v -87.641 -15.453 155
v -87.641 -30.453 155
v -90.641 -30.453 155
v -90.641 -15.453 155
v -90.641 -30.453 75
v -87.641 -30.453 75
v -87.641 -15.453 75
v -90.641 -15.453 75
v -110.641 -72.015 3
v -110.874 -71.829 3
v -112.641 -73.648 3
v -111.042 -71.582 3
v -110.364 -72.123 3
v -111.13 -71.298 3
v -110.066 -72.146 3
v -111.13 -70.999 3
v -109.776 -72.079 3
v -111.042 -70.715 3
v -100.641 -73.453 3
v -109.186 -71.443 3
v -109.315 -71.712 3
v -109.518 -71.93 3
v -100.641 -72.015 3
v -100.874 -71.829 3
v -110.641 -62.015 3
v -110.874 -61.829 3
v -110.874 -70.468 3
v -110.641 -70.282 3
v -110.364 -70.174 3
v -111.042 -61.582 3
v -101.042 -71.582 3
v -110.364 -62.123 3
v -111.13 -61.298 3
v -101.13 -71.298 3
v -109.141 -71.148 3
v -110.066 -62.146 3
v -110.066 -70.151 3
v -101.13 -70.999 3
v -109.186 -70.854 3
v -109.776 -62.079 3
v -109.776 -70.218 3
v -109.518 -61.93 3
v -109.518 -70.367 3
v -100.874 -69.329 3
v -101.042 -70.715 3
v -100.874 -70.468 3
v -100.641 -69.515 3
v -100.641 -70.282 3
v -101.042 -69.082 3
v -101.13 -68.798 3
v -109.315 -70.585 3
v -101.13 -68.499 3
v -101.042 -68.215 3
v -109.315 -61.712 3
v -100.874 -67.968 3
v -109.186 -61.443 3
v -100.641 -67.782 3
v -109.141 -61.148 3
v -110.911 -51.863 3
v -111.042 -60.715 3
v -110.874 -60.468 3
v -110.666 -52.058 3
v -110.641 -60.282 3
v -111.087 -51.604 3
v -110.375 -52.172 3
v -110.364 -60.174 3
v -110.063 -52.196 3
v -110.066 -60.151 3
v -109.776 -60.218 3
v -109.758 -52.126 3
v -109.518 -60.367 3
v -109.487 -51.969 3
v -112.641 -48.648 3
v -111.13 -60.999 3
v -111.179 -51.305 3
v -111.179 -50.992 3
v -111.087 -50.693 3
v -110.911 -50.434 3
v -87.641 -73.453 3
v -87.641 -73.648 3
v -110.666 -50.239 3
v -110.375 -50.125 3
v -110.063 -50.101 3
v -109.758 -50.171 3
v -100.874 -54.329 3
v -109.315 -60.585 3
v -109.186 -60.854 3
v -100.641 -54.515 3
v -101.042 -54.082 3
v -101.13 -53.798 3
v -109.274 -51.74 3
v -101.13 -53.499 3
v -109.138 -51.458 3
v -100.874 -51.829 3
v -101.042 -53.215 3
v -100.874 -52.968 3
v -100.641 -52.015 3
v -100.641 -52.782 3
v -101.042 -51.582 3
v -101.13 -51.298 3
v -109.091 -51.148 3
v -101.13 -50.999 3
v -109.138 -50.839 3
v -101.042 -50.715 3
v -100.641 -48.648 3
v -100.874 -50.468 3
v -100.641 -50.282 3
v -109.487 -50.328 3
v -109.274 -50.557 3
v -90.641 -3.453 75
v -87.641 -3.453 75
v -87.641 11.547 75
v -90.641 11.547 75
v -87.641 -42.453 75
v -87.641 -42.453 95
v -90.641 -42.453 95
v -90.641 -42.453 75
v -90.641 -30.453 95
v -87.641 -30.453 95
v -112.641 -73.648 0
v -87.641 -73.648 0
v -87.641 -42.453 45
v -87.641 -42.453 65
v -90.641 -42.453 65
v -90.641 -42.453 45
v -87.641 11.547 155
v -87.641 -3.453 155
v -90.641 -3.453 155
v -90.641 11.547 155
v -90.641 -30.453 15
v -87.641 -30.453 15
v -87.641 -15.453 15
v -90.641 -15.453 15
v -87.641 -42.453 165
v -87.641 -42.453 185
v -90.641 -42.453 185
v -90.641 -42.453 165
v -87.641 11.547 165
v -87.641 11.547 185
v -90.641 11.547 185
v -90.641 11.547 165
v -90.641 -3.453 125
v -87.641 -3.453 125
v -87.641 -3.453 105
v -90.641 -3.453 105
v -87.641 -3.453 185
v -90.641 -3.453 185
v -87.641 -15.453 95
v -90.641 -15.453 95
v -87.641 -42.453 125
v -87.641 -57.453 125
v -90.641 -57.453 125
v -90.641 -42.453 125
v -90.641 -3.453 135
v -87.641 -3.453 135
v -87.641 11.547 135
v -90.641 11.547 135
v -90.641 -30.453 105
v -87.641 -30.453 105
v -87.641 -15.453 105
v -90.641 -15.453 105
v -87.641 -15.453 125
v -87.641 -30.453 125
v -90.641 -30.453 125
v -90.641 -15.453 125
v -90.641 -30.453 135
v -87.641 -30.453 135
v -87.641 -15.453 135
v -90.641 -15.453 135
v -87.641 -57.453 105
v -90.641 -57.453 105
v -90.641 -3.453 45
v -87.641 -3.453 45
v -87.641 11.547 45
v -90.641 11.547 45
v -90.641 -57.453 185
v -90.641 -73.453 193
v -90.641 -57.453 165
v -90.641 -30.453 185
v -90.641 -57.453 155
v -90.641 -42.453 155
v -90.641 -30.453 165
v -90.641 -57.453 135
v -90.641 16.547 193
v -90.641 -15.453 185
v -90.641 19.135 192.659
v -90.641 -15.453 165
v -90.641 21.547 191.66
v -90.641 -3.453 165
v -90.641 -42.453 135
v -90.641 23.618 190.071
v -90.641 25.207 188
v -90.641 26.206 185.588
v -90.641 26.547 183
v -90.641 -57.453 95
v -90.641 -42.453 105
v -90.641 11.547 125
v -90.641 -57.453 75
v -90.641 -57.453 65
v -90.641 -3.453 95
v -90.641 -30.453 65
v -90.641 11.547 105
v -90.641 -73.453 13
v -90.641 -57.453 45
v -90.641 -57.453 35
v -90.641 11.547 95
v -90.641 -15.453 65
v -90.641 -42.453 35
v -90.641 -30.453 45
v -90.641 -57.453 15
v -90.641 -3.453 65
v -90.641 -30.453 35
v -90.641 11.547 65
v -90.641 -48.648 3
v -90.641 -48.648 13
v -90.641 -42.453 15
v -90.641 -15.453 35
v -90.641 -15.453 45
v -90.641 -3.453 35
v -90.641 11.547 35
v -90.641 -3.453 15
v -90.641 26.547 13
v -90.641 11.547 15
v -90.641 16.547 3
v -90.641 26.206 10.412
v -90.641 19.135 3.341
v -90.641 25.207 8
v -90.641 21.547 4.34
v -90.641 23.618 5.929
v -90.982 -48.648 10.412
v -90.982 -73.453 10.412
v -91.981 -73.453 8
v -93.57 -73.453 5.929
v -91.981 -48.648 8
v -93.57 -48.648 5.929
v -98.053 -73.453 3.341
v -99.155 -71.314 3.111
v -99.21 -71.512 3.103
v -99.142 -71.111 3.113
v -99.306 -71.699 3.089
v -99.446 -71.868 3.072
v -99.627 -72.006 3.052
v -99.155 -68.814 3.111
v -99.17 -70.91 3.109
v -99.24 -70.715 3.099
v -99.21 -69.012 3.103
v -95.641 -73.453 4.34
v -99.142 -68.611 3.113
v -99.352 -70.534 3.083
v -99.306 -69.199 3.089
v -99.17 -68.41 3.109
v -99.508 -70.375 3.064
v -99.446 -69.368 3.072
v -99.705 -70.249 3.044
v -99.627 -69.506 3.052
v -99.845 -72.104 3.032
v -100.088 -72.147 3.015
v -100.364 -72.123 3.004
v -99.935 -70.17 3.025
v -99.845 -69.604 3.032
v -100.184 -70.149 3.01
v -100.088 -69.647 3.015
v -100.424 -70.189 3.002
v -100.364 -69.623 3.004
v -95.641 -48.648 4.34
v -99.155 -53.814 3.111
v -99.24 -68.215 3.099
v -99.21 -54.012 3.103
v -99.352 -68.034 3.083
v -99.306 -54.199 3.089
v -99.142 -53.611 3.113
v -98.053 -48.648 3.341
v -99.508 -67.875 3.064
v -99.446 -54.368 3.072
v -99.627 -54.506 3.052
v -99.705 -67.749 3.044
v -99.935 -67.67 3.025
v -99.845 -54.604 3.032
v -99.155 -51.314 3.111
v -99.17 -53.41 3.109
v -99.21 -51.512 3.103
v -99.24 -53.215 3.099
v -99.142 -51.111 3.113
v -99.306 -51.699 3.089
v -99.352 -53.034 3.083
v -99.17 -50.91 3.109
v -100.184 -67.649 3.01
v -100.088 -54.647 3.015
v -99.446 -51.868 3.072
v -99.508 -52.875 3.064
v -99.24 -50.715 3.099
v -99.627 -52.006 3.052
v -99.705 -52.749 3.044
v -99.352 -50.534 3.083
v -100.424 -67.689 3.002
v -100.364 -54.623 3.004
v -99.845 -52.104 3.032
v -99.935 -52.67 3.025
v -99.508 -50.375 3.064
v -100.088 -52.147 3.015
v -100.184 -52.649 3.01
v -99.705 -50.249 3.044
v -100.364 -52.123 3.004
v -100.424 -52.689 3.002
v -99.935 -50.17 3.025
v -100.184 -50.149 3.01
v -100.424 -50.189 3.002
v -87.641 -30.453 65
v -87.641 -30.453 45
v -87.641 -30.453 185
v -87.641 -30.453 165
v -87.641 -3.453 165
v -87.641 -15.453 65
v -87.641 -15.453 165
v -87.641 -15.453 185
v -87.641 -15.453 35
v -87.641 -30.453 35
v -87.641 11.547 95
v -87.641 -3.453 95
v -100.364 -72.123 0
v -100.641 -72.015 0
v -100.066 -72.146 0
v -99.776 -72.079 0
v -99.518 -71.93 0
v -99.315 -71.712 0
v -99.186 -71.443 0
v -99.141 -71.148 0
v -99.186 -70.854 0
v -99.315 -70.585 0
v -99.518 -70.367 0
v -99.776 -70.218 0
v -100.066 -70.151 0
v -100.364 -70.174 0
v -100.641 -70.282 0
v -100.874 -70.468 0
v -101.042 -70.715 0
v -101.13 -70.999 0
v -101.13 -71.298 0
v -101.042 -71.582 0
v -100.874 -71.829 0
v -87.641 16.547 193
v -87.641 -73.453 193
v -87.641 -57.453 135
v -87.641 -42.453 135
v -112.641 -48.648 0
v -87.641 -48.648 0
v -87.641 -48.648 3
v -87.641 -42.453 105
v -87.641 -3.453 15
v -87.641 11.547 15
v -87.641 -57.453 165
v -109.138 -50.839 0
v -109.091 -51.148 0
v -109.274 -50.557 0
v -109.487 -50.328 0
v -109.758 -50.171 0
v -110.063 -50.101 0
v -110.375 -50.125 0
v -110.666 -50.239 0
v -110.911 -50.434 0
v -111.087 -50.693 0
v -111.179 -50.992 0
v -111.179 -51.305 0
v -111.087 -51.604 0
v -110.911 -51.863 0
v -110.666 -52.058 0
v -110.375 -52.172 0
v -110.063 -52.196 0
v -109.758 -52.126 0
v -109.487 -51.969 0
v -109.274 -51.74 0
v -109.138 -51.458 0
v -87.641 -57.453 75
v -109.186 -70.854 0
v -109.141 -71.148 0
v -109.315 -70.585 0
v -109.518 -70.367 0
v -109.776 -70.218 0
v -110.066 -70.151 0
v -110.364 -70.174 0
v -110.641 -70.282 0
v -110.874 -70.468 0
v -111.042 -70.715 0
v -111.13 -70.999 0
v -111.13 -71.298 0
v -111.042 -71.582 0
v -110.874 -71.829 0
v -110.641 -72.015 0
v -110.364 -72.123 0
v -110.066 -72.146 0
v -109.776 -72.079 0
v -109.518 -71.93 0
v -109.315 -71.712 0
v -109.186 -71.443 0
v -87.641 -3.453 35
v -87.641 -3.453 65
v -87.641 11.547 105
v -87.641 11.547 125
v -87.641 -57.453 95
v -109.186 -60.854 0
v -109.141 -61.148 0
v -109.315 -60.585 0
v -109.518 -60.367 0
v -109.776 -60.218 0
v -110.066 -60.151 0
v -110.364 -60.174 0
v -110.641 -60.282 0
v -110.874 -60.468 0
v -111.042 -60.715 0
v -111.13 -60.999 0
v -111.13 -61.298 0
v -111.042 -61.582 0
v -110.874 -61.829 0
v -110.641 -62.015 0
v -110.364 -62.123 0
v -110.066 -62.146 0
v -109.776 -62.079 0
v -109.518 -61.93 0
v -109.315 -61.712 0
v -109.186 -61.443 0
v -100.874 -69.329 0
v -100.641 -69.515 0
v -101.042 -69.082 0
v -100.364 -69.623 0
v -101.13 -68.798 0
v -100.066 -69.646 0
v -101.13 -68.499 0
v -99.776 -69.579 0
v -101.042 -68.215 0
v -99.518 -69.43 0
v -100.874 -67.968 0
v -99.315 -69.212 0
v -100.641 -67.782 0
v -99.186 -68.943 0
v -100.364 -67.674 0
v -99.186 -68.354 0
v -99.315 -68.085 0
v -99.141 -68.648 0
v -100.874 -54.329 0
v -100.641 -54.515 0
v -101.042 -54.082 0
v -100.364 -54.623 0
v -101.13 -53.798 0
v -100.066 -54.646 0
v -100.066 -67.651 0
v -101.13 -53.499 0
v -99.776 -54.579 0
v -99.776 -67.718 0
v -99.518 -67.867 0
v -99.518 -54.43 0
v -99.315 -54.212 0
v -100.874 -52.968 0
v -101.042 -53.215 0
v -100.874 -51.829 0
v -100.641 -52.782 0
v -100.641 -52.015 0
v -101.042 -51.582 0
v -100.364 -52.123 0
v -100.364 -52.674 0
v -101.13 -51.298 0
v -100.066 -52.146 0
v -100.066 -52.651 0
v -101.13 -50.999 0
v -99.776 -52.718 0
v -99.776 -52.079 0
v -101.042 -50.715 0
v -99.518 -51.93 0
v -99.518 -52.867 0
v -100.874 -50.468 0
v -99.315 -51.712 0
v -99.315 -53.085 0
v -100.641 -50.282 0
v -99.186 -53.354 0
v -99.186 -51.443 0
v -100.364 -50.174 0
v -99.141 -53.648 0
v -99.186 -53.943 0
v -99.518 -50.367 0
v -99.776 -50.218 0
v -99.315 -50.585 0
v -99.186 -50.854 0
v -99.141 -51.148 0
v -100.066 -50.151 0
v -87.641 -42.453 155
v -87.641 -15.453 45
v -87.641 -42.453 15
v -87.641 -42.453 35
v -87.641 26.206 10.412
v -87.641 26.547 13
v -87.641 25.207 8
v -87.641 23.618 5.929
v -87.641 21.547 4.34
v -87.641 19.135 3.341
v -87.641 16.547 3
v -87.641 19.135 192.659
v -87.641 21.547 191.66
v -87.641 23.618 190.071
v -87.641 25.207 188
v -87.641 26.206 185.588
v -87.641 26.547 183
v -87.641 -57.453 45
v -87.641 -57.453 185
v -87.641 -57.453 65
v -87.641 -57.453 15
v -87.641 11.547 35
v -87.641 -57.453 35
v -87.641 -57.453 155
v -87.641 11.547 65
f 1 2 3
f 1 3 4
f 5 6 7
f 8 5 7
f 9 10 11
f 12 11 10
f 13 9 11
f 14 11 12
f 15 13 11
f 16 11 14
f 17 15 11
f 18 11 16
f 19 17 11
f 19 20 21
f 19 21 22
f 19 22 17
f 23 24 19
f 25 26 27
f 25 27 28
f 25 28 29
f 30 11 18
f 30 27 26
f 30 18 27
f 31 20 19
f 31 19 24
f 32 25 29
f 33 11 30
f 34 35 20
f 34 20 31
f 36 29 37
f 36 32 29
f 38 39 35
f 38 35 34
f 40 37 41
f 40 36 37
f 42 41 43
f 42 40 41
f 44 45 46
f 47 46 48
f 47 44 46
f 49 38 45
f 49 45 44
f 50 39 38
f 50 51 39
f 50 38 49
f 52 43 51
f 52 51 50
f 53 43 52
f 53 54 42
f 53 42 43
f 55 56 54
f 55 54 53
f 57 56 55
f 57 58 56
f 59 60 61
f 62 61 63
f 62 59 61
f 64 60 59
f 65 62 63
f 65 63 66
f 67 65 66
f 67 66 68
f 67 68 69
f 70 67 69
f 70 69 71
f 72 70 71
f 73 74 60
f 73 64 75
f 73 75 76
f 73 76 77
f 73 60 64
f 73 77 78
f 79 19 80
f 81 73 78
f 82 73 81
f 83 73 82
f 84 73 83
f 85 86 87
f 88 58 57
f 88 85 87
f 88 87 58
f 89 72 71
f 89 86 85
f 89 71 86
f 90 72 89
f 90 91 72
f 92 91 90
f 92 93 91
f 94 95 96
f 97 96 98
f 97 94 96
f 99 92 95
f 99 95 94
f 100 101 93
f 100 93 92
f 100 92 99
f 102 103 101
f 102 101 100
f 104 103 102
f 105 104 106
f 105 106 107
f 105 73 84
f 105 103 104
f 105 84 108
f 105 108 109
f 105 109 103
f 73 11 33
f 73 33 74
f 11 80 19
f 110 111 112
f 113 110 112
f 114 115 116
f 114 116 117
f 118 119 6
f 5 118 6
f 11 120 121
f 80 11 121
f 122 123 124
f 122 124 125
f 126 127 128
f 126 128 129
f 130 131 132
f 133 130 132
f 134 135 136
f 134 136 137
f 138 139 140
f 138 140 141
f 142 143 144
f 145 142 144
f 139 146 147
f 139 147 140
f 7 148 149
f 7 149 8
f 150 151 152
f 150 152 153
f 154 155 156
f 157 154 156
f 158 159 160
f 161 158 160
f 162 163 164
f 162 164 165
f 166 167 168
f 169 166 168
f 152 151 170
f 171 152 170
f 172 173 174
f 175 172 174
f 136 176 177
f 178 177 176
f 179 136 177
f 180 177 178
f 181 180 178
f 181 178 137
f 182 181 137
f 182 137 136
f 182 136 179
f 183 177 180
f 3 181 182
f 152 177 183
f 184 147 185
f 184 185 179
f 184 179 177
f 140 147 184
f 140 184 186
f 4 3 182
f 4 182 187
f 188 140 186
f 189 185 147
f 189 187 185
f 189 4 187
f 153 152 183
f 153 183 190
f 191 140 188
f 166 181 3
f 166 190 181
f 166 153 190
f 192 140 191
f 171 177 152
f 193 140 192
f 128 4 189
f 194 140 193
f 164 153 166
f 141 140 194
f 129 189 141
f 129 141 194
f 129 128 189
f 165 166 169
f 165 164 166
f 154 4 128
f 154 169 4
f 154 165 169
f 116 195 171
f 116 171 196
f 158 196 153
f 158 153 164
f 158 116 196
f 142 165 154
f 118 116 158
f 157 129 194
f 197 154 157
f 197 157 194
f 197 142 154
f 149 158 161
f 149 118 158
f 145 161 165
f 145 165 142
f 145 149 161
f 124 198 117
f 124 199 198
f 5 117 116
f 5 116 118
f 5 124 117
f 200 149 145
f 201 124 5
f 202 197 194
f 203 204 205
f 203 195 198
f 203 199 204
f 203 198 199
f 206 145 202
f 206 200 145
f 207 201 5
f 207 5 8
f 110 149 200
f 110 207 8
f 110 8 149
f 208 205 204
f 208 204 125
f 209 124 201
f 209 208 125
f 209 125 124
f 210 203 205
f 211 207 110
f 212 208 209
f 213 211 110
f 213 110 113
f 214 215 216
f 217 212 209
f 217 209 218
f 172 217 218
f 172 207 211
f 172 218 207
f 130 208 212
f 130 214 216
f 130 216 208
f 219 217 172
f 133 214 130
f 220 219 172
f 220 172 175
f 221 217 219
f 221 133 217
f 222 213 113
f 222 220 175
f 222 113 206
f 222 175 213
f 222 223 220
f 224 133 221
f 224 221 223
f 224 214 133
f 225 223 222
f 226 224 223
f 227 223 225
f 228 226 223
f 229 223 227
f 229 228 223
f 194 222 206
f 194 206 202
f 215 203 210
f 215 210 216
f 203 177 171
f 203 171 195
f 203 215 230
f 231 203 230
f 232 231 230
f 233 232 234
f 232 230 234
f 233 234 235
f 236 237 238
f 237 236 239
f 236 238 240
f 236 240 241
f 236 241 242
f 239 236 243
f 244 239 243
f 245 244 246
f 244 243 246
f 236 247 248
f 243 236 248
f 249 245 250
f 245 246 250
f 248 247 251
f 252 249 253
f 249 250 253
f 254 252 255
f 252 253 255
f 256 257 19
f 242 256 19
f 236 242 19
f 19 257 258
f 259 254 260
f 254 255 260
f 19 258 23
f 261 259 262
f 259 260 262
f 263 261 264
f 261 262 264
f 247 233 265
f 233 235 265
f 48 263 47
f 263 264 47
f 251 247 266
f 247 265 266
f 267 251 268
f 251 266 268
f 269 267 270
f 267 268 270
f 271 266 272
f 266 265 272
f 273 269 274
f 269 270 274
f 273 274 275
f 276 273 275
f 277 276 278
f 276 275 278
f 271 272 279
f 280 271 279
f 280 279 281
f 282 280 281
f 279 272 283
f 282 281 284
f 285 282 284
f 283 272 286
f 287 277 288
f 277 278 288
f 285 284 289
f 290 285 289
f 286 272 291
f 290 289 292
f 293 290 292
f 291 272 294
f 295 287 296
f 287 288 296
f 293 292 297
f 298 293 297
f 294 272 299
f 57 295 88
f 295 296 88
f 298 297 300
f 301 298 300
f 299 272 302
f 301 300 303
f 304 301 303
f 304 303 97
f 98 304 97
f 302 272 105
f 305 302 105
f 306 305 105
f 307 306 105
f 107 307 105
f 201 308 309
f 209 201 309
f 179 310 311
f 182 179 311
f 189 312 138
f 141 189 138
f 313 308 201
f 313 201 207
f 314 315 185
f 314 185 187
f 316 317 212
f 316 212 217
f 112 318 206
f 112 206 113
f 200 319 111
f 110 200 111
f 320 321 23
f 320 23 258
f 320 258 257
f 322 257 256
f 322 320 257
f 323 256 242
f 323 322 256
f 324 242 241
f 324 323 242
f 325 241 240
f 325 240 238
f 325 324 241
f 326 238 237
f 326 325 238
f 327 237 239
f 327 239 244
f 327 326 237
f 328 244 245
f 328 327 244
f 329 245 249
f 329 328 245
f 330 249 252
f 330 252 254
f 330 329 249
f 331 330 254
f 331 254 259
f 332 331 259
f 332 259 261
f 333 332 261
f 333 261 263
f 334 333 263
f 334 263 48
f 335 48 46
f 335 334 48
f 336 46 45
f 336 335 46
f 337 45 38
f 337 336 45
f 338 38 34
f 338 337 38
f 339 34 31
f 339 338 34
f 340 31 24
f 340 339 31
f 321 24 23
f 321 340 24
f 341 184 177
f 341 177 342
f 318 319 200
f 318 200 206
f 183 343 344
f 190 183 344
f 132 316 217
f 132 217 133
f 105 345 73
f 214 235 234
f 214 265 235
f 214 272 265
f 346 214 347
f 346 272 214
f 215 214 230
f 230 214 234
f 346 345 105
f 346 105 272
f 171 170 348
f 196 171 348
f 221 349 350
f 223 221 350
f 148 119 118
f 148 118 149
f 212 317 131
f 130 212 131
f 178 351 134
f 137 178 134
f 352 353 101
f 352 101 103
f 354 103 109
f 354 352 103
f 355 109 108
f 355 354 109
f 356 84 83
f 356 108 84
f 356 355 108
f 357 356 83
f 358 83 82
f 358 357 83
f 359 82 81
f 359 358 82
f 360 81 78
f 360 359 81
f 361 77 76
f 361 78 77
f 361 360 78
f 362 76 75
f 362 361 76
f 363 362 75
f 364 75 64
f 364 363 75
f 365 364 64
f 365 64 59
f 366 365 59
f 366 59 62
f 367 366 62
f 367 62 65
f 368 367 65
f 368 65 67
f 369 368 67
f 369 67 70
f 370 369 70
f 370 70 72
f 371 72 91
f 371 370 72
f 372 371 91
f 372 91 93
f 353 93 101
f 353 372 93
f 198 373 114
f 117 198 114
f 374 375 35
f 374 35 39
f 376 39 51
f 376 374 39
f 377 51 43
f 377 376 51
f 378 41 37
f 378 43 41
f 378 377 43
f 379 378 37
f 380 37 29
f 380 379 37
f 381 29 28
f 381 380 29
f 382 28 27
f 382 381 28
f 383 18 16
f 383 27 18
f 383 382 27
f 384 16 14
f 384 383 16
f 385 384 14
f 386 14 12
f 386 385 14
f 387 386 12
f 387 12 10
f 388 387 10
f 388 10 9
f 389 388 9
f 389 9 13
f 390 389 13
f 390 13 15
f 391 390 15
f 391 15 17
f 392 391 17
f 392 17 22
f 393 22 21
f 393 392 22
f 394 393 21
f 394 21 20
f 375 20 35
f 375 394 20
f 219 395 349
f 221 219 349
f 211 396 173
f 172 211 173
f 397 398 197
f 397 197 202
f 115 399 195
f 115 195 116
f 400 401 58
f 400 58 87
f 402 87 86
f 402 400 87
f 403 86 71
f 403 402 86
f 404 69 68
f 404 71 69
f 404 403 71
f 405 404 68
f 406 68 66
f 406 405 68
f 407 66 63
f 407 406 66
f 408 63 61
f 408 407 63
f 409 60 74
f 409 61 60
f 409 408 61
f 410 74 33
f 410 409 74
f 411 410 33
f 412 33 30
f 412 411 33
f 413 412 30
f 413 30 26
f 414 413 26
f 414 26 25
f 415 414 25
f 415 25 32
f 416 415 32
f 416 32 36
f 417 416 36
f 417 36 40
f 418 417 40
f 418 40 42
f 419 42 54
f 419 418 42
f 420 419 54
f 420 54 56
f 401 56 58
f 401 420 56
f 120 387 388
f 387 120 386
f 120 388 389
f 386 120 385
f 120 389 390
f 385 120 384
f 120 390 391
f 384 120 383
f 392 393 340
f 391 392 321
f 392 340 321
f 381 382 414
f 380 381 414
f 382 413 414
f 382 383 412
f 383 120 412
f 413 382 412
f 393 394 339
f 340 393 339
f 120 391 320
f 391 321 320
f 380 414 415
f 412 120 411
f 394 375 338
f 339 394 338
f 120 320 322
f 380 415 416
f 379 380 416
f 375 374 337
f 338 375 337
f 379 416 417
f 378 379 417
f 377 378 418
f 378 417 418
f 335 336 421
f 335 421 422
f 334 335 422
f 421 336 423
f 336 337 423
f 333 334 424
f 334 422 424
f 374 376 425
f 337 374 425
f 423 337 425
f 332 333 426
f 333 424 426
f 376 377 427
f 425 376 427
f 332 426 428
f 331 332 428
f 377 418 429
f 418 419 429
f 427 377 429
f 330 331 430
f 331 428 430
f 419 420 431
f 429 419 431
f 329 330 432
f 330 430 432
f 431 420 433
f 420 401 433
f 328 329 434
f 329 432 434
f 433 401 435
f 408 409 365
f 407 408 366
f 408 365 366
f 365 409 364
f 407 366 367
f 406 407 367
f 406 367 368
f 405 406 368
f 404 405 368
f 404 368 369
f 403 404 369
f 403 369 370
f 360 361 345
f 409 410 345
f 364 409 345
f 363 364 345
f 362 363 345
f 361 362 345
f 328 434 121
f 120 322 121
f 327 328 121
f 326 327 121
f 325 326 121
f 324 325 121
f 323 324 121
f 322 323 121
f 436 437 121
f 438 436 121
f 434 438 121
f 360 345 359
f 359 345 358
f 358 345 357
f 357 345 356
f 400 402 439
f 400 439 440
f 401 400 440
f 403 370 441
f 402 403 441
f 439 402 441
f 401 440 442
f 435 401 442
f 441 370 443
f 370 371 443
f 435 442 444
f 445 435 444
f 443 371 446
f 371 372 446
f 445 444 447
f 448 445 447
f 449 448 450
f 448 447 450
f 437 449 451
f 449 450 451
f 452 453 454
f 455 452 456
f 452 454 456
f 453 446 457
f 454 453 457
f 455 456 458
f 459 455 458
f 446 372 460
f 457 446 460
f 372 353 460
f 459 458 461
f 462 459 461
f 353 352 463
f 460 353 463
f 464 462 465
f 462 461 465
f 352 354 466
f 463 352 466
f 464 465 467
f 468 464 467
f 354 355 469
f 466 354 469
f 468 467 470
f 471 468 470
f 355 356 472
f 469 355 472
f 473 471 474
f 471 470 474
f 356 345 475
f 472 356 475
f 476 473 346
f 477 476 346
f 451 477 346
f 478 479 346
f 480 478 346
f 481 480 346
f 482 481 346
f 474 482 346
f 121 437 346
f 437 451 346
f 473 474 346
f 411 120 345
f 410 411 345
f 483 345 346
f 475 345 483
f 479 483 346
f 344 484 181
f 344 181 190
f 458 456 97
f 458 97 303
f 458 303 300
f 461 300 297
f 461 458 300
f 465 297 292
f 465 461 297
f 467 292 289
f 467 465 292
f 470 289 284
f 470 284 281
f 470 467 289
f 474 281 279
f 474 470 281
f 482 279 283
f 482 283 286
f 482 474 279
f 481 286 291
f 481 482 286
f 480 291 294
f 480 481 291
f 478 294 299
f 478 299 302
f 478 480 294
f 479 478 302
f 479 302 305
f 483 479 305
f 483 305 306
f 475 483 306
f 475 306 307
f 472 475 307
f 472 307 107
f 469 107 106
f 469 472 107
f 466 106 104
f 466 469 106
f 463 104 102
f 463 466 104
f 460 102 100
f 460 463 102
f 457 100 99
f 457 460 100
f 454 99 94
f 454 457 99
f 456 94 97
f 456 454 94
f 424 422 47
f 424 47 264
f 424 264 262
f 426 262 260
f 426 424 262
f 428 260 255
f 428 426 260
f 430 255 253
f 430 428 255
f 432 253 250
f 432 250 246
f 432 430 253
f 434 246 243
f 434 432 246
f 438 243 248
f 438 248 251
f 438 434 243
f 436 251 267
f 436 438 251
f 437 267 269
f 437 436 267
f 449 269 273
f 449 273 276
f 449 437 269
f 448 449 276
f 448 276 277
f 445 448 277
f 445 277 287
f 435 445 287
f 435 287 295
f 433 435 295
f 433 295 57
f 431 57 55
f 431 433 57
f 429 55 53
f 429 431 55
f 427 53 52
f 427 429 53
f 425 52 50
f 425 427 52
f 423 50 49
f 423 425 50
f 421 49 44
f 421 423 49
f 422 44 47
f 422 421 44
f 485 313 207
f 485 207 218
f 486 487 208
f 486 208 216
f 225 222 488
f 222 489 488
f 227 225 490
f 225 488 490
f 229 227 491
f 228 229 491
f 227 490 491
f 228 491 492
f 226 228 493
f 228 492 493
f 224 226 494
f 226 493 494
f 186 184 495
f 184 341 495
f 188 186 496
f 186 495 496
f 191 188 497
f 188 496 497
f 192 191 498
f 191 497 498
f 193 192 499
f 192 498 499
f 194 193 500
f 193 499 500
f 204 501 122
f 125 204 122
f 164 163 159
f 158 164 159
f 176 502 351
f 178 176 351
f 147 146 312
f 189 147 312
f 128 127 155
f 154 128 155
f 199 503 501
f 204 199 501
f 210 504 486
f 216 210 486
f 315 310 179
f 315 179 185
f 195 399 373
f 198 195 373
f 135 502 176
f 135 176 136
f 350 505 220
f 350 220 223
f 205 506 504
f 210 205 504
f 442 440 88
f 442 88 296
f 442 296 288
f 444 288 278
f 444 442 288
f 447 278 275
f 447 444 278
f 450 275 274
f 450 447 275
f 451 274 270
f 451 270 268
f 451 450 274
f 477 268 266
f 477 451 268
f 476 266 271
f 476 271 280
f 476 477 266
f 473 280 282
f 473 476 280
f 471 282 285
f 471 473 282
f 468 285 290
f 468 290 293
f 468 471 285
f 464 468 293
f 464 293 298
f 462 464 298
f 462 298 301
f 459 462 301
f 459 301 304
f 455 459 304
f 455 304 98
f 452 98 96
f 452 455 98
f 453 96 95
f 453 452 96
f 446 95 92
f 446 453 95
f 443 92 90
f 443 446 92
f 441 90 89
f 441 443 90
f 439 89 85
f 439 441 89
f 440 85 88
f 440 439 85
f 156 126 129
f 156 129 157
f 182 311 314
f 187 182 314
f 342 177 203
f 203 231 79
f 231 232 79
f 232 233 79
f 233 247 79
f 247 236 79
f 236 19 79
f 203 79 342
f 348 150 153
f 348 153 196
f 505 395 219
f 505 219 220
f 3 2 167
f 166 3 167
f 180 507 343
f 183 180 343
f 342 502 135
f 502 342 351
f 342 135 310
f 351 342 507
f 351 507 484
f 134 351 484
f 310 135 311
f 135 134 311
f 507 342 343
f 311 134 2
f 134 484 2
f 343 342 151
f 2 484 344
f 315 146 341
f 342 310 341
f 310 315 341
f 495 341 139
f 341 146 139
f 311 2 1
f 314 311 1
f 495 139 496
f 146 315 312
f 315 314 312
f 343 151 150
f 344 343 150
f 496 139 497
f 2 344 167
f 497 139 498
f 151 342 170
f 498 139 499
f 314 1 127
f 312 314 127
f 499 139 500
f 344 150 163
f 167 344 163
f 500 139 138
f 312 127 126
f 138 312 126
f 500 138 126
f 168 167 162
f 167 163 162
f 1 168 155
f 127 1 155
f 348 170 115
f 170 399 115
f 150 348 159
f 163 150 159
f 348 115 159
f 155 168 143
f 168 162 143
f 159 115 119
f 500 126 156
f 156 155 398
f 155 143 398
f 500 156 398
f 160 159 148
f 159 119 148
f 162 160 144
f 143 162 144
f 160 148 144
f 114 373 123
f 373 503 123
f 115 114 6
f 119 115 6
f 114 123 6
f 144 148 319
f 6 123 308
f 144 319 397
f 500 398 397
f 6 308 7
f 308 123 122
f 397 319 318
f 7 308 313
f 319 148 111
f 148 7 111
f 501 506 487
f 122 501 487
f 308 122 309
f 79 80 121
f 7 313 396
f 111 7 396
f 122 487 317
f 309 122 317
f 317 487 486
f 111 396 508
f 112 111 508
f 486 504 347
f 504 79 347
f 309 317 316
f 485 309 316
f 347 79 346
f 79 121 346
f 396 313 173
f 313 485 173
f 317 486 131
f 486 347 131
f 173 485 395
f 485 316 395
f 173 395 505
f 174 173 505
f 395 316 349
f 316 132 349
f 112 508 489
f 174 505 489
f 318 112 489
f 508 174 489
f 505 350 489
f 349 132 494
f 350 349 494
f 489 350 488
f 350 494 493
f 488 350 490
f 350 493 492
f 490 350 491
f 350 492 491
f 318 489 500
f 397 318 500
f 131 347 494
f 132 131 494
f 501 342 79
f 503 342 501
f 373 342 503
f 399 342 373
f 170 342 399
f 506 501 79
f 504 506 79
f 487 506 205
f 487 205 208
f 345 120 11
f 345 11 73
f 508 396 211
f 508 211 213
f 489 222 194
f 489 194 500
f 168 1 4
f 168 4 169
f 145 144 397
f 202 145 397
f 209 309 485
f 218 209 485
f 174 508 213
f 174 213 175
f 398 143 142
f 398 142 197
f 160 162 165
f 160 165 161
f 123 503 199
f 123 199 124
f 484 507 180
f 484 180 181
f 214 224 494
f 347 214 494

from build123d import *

# Parameters (mm, degrees)
SKETCH_1_W               = 25
SKETCH_1_H               = 25
EXTRUDE_1_DEPTH          = 3
SKETCH_2_W               = 3
SKETCH_2_H               = 100
EXTRUDE_2_DEPTH          = 190
FILLET_1_R               = 10
SKETCH_3_W               = 20
SKETCH_3_H               = 15
CUT_EXTRUDE_2_DEPTH      = 10
FILLET_2_R               = 10
FILLET_3_R               = 10
CUT_EXTRUDE_3_DEPTH      = 5
CUT_EXTRUDE_3_DEPTH_BACK = 5
SKETCH_4_R               = 1.05
SKETCH_4_R_2             = 1


with BuildPart() as part:
    # 草图1 → 凸台-拉伸1 (new body)
    with BuildSketch(Plane.XY):
        with Locations((-100.141216583, -61.148491789)):
            Rectangle(SKETCH_1_W, SKETCH_1_H)
    extrude(amount=EXTRUDE_1_DEPTH)

    # 草图2 → 凸台-拉伸2 (add)
    with BuildSketch(Plane.XY.offset(3)):
        with Locations((-89.141216583, -23.452816851)):
            Rectangle(SKETCH_2_W, SKETCH_2_H)
    extrude(amount=EXTRUDE_2_DEPTH)

    # 圆角1
    fillet_1_edges = [part.edges().sort_by_distance(p)[0] for p in [
        (-90.641216583, -61.05065432, 3),
    ]]
    fillet(fillet_1_edges, radius=FILLET_1_R)

    # 草图3 → 切除-拉伸2 (cut)
    with BuildSketch(Plane(origin=(-87.641216583, 0, 0), x_dir=(0, 0, -1), z_dir=(1, 0, 0))):
        with Locations((-25, 4.047183149)):
            Rectangle(SKETCH_3_W, SKETCH_3_H)
        with Locations((-55, 4.047183149)):
            Rectangle(SKETCH_3_W, SKETCH_3_H)
        with Locations((-85, 4.047183149)):
            Rectangle(SKETCH_3_W, SKETCH_3_H)
        with Locations((-115, 4.047183149)):
            Rectangle(SKETCH_3_W, SKETCH_3_H)
        with Locations((-145, 4.047183149)):
            Rectangle(SKETCH_3_W, SKETCH_3_H)
        with Locations((-175, 4.047183149)):
            Rectangle(SKETCH_3_W, SKETCH_3_H)
        with Locations((-55, -22.952816851)):
            Rectangle(SKETCH_3_W, SKETCH_3_H)
        with Locations((-85, -22.952816851)):
            Rectangle(SKETCH_3_W, SKETCH_3_H)
        with Locations((-115, -22.952816851)):
            Rectangle(SKETCH_3_W, SKETCH_3_H)
        with Locations((-145, -22.952816851)):
            Rectangle(SKETCH_3_W, SKETCH_3_H)
        with Locations((-175, -22.952816851)):
            Rectangle(SKETCH_3_W, SKETCH_3_H)
        with Locations((-55, -49.952816851)):
            Rectangle(SKETCH_3_W, SKETCH_3_H)
        with Locations((-85, -49.952816851)):
            Rectangle(SKETCH_3_W, SKETCH_3_H)
        with Locations((-115, -49.952816851)):
            Rectangle(SKETCH_3_W, SKETCH_3_H)
        with Locations((-145, -49.952816851)):
            Rectangle(SKETCH_3_W, SKETCH_3_H)
        with Locations((-175, -49.952816851)):
            Rectangle(SKETCH_3_W, SKETCH_3_H)
        with Locations((-25, -22.952816851)):
            Rectangle(SKETCH_3_W, SKETCH_3_H)
        with Locations((-25, -49.952816851)):
            Rectangle(SKETCH_3_W, SKETCH_3_H)
    extrude(amount=-CUT_EXTRUDE_2_DEPTH, mode=Mode.SUBTRACT)

    # 圆角2
    fillet_2_edges = [part.edges().sort_by_distance(p)[0] for p in [
        (-89.141216583, 26.547183149, 193),
    ]]
    fillet(fillet_2_edges, radius=FILLET_2_R)

    # 圆角3
    fillet_3_edges = [part.edges().sort_by_distance(p)[0] for p in [
        (-89.141216583, 26.547183149, 3),
    ]]
    fillet(fillet_3_edges, radius=FILLET_3_R)

    # 草图4 → 切除-拉伸3 (cut, two sides: drawn at the far end of the back side and taken through both)
    with BuildSketch(Plane.XY.offset(3).offset(-CUT_EXTRUDE_3_DEPTH_BACK)):
        with Locations((-110.141216583, -51.148491789)):
            Circle(SKETCH_4_R)
        with Locations((-110.141216583, -61.148491789)):
            Circle(SKETCH_4_R_2)
        with Locations((-110.141216583, -71.148491789)):
            Circle(SKETCH_4_R_2)
        with Locations(Location((-100.141216583, -71.148491789, 0), (0, 0, 239.999999998))):
            Circle(SKETCH_4_R_2)
        with Locations(Location((-100.141216583, -68.648491789, 0), (0, 0, 239.999999998))):
            Circle(SKETCH_4_R_2)
        with Locations(Location((-100.141216583, -51.148491789, 0), (0, 0, 239.999999998))):
            Circle(SKETCH_4_R_2)
        with Locations(Location((-100.141216583, -53.648491789, 0), (0, 0, 239.999999998))):
            Circle(SKETCH_4_R_2)
    extrude(amount=CUT_EXTRUDE_3_DEPTH + CUT_EXTRUDE_3_DEPTH_BACK, mode=Mode.SUBTRACT)


solid = part.part
